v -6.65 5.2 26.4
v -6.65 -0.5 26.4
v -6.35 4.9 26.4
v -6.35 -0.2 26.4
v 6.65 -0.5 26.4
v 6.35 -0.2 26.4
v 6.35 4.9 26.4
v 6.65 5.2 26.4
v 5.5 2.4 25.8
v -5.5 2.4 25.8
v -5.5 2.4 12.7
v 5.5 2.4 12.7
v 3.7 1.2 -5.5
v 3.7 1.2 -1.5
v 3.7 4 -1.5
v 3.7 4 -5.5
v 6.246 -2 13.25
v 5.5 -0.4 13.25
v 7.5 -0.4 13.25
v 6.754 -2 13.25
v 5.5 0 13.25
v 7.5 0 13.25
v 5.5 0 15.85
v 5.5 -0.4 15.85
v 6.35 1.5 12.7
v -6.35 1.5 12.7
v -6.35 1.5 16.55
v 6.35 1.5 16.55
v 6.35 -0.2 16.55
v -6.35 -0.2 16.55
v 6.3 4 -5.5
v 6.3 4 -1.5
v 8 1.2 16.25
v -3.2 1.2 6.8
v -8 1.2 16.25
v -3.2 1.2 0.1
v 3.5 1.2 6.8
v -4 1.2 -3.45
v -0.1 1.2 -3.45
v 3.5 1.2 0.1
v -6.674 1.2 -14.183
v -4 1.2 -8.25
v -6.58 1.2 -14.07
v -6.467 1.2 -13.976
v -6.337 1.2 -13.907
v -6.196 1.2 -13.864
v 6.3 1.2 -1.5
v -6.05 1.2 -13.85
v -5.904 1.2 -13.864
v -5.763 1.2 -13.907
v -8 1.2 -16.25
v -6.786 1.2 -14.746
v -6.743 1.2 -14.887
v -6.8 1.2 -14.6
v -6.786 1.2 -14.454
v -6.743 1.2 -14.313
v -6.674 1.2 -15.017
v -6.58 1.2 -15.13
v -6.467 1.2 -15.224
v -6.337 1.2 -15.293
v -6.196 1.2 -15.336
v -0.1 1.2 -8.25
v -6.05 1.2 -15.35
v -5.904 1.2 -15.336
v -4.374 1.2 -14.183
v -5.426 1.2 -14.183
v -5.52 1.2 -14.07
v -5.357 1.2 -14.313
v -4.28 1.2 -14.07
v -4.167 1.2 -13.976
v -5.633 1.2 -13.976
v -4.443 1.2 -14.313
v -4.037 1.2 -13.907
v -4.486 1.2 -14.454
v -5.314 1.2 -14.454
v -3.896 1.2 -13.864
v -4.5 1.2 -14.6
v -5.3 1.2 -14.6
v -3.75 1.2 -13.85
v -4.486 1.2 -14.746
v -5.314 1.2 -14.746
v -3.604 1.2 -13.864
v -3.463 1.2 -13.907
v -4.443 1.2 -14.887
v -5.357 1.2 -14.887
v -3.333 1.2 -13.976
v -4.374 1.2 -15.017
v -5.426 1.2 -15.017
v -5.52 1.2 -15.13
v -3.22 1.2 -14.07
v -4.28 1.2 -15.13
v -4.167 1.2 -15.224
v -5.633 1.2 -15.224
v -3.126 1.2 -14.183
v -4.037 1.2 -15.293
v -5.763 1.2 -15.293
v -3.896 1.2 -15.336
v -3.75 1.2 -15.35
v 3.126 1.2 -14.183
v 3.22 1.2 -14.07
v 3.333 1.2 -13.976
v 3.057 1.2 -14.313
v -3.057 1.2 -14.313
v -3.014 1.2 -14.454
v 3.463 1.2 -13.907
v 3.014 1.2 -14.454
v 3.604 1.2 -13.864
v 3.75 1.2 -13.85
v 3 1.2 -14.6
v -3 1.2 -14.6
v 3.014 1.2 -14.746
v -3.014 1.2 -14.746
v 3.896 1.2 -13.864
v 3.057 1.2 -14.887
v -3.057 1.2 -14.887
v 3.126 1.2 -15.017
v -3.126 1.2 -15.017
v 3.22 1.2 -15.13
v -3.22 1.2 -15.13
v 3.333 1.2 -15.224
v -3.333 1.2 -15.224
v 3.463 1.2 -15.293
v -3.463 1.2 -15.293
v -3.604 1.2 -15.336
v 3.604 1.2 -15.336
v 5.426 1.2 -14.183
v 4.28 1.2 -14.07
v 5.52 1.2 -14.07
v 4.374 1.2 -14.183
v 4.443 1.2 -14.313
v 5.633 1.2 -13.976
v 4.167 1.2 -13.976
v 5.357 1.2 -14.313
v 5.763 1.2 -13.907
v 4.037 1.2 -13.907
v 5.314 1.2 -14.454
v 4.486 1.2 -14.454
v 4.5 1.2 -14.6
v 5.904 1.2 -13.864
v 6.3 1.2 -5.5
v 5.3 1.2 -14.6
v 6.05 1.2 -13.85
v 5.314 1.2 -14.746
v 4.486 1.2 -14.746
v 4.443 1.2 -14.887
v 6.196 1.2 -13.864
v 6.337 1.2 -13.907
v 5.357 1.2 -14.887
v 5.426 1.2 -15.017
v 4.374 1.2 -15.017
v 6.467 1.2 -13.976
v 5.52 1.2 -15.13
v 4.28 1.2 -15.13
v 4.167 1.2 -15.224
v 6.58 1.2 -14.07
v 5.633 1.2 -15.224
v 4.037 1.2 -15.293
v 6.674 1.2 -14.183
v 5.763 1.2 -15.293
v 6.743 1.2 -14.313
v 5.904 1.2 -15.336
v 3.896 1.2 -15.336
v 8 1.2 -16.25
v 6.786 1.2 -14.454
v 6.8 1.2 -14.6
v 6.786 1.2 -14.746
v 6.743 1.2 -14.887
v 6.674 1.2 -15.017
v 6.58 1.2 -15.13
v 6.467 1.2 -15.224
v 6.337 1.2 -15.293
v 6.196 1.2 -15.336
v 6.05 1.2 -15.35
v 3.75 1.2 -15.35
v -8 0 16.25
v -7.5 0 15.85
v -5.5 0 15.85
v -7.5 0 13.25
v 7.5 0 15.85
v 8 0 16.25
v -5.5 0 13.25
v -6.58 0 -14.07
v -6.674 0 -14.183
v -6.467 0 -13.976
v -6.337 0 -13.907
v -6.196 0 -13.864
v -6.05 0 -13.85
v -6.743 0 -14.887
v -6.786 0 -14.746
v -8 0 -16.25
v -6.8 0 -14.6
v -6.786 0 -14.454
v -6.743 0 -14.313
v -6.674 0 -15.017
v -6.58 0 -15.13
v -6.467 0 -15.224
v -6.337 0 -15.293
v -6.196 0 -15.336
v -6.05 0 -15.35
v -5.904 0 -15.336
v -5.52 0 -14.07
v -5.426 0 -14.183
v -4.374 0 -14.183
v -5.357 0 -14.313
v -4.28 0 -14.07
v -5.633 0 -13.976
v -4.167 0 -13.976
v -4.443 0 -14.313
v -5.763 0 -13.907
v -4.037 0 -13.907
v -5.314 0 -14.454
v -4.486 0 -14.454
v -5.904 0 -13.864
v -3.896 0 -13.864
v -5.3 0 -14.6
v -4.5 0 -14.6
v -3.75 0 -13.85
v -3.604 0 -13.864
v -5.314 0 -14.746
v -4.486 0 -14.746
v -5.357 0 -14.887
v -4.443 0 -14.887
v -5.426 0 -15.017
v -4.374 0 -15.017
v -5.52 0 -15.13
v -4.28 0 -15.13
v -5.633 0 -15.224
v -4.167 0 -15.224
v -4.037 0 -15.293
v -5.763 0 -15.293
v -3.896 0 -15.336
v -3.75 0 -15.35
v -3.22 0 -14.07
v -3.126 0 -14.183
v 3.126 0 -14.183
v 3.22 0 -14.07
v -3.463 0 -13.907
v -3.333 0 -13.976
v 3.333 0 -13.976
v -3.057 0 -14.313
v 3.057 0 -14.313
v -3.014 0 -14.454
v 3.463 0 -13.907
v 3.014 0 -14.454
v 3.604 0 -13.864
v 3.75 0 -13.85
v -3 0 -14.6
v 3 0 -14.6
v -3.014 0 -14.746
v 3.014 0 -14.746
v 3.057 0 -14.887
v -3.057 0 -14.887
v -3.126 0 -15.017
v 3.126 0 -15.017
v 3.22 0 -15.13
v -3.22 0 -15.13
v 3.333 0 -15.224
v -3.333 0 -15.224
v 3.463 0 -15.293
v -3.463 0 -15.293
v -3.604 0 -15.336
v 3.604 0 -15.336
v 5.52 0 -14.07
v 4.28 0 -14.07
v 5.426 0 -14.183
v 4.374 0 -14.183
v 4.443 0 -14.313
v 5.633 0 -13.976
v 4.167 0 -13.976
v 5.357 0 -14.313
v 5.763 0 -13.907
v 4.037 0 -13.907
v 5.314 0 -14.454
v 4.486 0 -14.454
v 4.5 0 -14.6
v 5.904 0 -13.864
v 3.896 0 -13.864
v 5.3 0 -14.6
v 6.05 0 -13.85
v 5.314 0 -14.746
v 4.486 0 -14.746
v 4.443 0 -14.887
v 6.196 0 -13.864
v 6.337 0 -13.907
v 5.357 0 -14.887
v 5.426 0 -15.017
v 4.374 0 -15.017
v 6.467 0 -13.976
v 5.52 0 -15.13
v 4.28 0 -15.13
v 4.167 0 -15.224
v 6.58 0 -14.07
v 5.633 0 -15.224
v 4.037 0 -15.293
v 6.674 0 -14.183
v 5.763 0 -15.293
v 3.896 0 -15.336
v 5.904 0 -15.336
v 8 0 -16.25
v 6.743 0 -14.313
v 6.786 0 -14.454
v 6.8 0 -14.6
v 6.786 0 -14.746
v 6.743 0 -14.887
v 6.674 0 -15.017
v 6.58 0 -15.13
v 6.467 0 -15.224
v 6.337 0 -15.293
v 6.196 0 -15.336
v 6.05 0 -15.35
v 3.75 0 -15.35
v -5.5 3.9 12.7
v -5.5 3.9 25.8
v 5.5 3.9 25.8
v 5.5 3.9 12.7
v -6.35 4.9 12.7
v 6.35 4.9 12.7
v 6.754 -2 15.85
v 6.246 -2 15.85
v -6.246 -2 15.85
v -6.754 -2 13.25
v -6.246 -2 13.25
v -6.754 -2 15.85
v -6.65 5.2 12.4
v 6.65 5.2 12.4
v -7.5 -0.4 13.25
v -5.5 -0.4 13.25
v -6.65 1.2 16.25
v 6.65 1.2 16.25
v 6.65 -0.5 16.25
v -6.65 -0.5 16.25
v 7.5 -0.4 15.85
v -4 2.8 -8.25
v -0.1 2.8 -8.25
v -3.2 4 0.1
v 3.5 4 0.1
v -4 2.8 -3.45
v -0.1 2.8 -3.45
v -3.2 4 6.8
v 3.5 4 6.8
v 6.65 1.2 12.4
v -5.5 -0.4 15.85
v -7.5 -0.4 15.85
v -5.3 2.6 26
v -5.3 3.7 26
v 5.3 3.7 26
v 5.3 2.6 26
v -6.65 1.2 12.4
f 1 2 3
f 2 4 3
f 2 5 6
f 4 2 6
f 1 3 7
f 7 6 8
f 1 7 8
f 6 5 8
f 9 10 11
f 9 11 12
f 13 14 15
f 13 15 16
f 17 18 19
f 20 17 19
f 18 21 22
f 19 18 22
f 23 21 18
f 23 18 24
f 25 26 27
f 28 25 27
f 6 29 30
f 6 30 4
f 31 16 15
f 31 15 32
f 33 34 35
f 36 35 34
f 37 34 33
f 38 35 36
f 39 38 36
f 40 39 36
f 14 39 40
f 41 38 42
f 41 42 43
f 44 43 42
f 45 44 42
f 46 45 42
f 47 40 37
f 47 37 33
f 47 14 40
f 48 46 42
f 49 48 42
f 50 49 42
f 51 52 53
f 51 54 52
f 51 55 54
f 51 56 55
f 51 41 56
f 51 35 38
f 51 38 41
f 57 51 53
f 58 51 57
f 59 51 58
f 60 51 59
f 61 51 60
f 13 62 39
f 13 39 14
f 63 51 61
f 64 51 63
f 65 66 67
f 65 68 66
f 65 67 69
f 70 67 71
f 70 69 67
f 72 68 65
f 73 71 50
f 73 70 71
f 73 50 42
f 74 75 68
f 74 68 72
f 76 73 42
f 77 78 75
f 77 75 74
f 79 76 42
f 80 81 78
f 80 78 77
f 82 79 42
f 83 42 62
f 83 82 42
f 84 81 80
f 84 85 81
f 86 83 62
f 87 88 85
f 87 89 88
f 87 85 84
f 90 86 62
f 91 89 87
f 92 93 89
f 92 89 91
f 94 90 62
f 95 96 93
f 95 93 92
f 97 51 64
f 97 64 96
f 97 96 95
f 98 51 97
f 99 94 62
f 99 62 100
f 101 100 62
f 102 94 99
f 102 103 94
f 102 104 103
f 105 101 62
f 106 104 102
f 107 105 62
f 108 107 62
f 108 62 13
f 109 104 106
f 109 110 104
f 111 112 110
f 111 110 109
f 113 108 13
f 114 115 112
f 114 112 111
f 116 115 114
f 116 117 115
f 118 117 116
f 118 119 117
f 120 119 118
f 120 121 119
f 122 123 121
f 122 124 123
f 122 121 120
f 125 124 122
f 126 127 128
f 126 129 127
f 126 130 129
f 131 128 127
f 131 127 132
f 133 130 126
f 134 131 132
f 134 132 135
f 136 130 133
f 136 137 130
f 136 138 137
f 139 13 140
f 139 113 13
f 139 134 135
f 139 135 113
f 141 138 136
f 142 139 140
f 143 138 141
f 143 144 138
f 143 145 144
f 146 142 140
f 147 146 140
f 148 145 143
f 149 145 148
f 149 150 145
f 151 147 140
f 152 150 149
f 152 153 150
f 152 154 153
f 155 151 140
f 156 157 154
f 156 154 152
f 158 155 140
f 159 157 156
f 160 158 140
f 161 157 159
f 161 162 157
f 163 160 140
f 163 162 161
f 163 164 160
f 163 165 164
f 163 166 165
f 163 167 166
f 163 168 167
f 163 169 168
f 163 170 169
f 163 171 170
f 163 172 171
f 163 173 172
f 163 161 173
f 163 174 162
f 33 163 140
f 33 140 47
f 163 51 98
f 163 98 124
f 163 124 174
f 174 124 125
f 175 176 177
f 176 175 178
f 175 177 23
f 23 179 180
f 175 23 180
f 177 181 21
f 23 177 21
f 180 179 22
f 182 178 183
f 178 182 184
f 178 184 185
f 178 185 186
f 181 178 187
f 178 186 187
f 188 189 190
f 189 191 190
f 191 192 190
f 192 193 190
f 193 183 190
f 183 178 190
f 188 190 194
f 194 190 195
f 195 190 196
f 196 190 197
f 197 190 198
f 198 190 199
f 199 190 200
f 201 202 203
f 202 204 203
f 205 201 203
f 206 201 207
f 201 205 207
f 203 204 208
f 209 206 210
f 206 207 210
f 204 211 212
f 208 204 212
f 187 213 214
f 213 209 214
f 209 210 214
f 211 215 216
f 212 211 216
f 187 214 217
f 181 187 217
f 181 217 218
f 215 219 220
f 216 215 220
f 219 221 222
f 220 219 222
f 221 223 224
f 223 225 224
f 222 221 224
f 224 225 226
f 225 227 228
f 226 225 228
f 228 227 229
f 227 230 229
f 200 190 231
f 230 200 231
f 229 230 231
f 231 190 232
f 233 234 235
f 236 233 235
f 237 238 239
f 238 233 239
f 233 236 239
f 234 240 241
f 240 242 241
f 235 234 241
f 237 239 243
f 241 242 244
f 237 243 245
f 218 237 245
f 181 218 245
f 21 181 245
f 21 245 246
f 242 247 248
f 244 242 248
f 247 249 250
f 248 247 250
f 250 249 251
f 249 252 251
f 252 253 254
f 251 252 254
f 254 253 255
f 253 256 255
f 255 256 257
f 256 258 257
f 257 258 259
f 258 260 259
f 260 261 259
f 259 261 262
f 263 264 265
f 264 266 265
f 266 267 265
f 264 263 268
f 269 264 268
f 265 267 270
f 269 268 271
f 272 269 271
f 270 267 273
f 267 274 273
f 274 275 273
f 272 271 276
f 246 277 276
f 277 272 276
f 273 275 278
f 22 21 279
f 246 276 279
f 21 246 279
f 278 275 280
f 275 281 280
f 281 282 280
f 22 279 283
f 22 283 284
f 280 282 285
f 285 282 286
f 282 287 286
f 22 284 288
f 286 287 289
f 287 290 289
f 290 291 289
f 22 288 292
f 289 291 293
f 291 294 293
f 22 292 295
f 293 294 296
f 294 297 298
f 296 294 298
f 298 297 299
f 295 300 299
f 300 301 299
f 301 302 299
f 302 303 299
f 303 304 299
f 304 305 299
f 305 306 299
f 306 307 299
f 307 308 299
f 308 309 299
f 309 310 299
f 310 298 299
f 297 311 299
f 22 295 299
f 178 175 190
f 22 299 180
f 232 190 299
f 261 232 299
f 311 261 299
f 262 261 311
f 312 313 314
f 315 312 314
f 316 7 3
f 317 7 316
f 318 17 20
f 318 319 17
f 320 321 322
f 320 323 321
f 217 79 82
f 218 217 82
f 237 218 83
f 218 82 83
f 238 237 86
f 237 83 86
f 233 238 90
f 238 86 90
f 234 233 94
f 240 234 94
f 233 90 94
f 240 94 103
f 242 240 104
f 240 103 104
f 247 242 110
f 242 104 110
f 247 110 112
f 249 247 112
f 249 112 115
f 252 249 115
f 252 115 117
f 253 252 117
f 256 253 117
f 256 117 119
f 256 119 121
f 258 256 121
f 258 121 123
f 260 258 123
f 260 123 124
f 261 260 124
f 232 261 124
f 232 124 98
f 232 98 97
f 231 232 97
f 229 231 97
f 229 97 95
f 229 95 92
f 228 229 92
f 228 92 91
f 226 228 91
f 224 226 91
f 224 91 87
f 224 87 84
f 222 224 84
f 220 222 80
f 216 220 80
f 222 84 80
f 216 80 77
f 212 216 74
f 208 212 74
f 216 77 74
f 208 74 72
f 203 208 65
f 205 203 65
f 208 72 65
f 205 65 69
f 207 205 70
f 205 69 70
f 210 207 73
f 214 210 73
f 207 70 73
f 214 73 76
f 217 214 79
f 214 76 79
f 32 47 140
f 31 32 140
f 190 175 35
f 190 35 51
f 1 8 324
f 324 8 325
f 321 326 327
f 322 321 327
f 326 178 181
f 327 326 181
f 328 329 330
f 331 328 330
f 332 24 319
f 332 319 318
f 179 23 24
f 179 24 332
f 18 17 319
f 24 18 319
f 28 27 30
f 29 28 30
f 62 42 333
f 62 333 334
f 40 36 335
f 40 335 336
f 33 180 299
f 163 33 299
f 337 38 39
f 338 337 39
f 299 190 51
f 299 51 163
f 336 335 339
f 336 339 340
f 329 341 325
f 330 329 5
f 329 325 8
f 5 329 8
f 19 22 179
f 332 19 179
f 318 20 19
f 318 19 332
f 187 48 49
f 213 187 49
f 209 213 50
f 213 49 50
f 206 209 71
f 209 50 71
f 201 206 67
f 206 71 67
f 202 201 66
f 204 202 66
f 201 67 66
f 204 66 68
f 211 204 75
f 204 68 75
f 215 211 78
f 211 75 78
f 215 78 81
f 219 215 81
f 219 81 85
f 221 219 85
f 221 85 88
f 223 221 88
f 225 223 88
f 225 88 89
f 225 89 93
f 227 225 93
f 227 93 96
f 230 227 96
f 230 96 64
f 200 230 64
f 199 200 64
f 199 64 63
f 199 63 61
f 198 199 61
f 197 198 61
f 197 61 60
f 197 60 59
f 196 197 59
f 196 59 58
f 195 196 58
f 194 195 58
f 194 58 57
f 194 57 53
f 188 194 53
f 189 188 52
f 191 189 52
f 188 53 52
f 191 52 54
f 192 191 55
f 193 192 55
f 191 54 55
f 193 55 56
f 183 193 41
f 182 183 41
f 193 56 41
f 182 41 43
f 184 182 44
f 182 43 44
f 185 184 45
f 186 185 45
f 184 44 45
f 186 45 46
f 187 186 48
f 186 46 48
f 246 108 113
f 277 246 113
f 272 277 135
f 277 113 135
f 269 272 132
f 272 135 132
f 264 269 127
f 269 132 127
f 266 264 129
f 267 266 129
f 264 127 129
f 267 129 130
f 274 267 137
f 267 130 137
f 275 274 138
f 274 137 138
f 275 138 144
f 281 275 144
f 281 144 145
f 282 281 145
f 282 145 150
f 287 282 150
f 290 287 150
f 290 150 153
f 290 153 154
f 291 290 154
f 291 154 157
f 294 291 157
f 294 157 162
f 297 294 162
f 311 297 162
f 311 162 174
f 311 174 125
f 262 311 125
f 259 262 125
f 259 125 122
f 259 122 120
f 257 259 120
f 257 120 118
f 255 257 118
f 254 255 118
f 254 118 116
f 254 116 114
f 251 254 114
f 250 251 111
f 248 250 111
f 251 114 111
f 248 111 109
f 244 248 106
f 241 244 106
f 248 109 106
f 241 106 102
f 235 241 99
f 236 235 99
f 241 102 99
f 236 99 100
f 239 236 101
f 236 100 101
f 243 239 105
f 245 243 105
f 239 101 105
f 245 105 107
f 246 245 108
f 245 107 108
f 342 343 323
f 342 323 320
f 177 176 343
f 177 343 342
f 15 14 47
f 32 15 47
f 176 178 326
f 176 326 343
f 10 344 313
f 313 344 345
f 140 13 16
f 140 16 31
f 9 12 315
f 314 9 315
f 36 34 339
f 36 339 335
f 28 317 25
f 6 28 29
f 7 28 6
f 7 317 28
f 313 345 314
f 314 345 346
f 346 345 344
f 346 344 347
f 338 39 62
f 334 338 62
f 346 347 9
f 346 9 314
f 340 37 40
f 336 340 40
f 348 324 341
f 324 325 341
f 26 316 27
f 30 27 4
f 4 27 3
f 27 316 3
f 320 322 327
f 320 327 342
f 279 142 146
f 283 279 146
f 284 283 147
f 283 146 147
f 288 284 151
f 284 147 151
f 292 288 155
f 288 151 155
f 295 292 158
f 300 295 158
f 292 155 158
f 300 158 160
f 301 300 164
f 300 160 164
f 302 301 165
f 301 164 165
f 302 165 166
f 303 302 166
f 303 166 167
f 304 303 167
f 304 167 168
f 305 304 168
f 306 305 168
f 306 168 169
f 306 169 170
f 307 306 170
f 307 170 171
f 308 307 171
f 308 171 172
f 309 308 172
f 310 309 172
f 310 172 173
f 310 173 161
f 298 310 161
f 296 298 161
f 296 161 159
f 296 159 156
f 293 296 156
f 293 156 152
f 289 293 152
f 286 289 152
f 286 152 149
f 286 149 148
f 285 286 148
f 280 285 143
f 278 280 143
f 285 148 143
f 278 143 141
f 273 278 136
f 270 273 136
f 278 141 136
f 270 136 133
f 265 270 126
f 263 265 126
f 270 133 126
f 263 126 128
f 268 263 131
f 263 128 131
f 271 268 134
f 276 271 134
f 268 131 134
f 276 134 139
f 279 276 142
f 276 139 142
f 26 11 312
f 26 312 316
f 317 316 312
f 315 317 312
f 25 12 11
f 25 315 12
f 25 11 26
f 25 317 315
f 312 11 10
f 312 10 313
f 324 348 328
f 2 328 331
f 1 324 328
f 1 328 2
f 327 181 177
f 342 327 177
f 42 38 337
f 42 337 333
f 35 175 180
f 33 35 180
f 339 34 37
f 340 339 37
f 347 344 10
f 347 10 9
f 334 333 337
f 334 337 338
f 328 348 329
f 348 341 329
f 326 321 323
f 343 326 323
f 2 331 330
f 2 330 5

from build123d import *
from OCP.BRepFilletAPI import BRepFilletAPI_MakeChamfer

# Parameters (mm, degrees)
SCHIZZO1_W                   = 16
SCHIZZO1_H                   = 32.5
ESTRUSIONE_ESTRUSIONE1_DEPTH = 1.2
ESTRUSIONE_ESTRUSIONE2_DEPTH = 6.65
SVUOTA1_T                    = -0.3
SCHIZZO4_W                   = 11
SCHIZZO4_H                   = 1.5
ESTRUSIONE_ESTRUSIONE3_DEPTH = 13.3
SMUSSO1_SIZE                 = 0.2
SCHIZZO5_W                   = 2
SCHIZZO5_H                   = 2.6
ESTRUSIONE_ESTRUSIONE4_DEPTH = 2
SMUSSO2_SIZE                 = 1.6
SMUSSO2_SIZE2                = 0.746092253
SCHIZZO6_W                   = 6.7
SCHIZZO6_H                   = 6.7
SCHIZZO6_W_2                 = 2.6
SCHIZZO6_H_2                 = 4
ESTRUSIONE_ESTRUSIONE5_DEPTH = 2.8
SCHIZZO7_W                   = 3.9
SCHIZZO7_H                   = 4.8
ESTRUSIONE_ESTRUSIONE6_DEPTH = 1.6
SCHIZZO9_R                   = 0.75
TAGLIO_ESTRUSIONE1_DEPTH     = 28.874002224


with BuildPart() as part:
    # Schizzo1 → Estrusione-Estrusione1 (new body)
    with BuildSketch(Plane(origin=(0, 0, 0), x_dir=(1, 0, 0), z_dir=(0, 1, 0))):
        Rectangle(SCHIZZO1_W, SCHIZZO1_H)
    extrude(amount=ESTRUSIONE_ESTRUSIONE1_DEPTH)

    # Schizzo5 → Estrusione-Estrusione4 (add)
    with BuildSketch(Plane.XZ):
        with Locations((-6.5, 14.55)):
            Rectangle(SCHIZZO5_W, SCHIZZO5_H)
        with Locations((6.5, 14.55)):
            Rectangle(SCHIZZO5_W, SCHIZZO5_H)
    extrude(amount=ESTRUSIONE_ESTRUSIONE4_DEPTH)

    # Smusso2: one chamfer whose edges measure the first distance from different faces: ONE call of the kernel's chamfer builder (chamfer() names one face for all edges)
    smusso2_edges_1 = [part.edges().sort_by_distance(p)[0] for p in [
        (-5.5, -2, 14.55),
    ]]
    smusso2_side_1 = [part.faces().sort_by_distance(p)[0] for p in [
        (-5.5, -1, 14.55),
    ]]
    smusso2_edges_2 = [part.edges().sort_by_distance(p)[0] for p in [
        (-7.5, -2, 14.55),
    ]]
    smusso2_side_2 = [part.faces().sort_by_distance(p)[0] for p in [
        (-7.5, -1, 14.55),
    ]]
    smusso2_edges_3 = [part.edges().sort_by_distance(p)[0] for p in [
        (7.5, -2, 14.55),
    ]]
    smusso2_side_3 = [part.faces().sort_by_distance(p)[0] for p in [
        (7.5, -1, 14.55),
    ]]
    smusso2_edges_4 = [part.edges().sort_by_distance(p)[0] for p in [
        (5.5, -2, 14.55),
    ]]
    smusso2_side_4 = [part.faces().sort_by_distance(p)[0] for p in [
        (5.5, -1, 14.55),
    ]]
    smusso2 = BRepFilletAPI_MakeChamfer(part.part.solid().wrapped)
    for e in smusso2_edges_1:
        smusso2.Add(SMUSSO2_SIZE, SMUSSO2_SIZE2, e.wrapped, smusso2_side_1[0].wrapped)  # the first distance lies on this face
    for e in smusso2_edges_2:
        smusso2.Add(SMUSSO2_SIZE, SMUSSO2_SIZE2, e.wrapped, smusso2_side_2[0].wrapped)  # the first distance lies on this face
    for e in smusso2_edges_3:
        smusso2.Add(SMUSSO2_SIZE, SMUSSO2_SIZE2, e.wrapped, smusso2_side_3[0].wrapped)  # the first distance lies on this face
    for e in smusso2_edges_4:
        smusso2.Add(SMUSSO2_SIZE, SMUSSO2_SIZE2, e.wrapped, smusso2_side_4[0].wrapped)  # the first distance lies on this face
    add(Compound.cast(smusso2.Shape()), mode=Mode.REPLACE)

    # Schizzo6 → Estrusione-Estrusione5 (add)
    with BuildSketch(Plane(origin=(0, 1.2, 0), x_dir=(1, 0, 0), z_dir=(0, 1, 0))):
        with Locations((0.15, -3.45)):
            Rectangle(SCHIZZO6_W, SCHIZZO6_H)
        with Locations((5, 3.5)):
            Rectangle(SCHIZZO6_W_2, SCHIZZO6_H_2)
    extrude(amount=ESTRUSIONE_ESTRUSIONE5_DEPTH)

    # Schizzo7 → Estrusione-Estrusione6 (add)
    with BuildSketch(Plane(origin=(0, 1.2, 0), x_dir=(1, 0, 0), z_dir=(0, 1, 0))):
        with Locations((-2.05, 5.85)):
            Rectangle(SCHIZZO7_W, SCHIZZO7_H)
    extrude(amount=ESTRUSIONE_ESTRUSIONE6_DEPTH)

    # Schizzo9 → Taglio-Estrusione1 (cut, through all)
    with BuildSketch(Plane(origin=(0, 1.2, 0), x_dir=(1, 0, 0), z_dir=(0, 1, 0))):
        with Locations(Location((-6.05, 14.6, 0), (0, 0, 270))):
            Circle(SCHIZZO9_R)
        with Locations(Location((-3.75, 14.6, 0), (0, 0, 270))):
            Circle(SCHIZZO9_R)
        with Locations(Location((3.75, 14.6, 0), (0, 0, 270))):
            Circle(SCHIZZO9_R)
        with Locations(Location((6.05, 14.6, 0), (0, 0, 270))):
            Circle(SCHIZZO9_R)
    extrude(amount=-TAGLIO_ESTRUSIONE1_DEPTH, mode=Mode.SUBTRACT)


with BuildPart() as body_2:
    # Schizzo3 → Estrusione-Estrusione2 (new, symmetric)
    with BuildSketch(Plane(origin=(0, 0, 0), x_dir=(0, 0, -1), z_dir=(1, 0, 0))):
        Polygon((-26.4, -0.5), (-26.4, 5.2), (-12.4, 5.2), (-12.4, 1.2), (-16.25, 1.2), (-16.25, -0.5), align=None)
    extrude(amount=ESTRUSIONE_ESTRUSIONE2_DEPTH, both=True)

    # Svuota1
    svuota1_openings = [body_2.faces().sort_by_distance(p)[0] for p in [
        (0, 2.35, 26.4),
    ]]
    offset(amount=SVUOTA1_T, openings=svuota1_openings, kind=Kind.INTERSECTION)

    # Schizzo4 → Estrusione-Estrusione3 (add)
    with BuildSketch(Plane.XY.offset(12.7)):
        with Locations((0, 3.15)):
            Rectangle(SCHIZZO4_W, SCHIZZO4_H)
    extrude(amount=ESTRUSIONE_ESTRUSIONE3_DEPTH)

    # Smusso1
    smusso1_edges = [body_2.edges().sort_by_distance(p)[0] for p in [
        (-5.5, 3.15, 26),
        (0, 2.4, 26),
        (5.5, 3.15, 26),
        (0, 3.9, 26),
    ]]
    chamfer(smusso1_edges, length=SMUSSO1_SIZE)


solid = Compound([part.part, body_2.part])
